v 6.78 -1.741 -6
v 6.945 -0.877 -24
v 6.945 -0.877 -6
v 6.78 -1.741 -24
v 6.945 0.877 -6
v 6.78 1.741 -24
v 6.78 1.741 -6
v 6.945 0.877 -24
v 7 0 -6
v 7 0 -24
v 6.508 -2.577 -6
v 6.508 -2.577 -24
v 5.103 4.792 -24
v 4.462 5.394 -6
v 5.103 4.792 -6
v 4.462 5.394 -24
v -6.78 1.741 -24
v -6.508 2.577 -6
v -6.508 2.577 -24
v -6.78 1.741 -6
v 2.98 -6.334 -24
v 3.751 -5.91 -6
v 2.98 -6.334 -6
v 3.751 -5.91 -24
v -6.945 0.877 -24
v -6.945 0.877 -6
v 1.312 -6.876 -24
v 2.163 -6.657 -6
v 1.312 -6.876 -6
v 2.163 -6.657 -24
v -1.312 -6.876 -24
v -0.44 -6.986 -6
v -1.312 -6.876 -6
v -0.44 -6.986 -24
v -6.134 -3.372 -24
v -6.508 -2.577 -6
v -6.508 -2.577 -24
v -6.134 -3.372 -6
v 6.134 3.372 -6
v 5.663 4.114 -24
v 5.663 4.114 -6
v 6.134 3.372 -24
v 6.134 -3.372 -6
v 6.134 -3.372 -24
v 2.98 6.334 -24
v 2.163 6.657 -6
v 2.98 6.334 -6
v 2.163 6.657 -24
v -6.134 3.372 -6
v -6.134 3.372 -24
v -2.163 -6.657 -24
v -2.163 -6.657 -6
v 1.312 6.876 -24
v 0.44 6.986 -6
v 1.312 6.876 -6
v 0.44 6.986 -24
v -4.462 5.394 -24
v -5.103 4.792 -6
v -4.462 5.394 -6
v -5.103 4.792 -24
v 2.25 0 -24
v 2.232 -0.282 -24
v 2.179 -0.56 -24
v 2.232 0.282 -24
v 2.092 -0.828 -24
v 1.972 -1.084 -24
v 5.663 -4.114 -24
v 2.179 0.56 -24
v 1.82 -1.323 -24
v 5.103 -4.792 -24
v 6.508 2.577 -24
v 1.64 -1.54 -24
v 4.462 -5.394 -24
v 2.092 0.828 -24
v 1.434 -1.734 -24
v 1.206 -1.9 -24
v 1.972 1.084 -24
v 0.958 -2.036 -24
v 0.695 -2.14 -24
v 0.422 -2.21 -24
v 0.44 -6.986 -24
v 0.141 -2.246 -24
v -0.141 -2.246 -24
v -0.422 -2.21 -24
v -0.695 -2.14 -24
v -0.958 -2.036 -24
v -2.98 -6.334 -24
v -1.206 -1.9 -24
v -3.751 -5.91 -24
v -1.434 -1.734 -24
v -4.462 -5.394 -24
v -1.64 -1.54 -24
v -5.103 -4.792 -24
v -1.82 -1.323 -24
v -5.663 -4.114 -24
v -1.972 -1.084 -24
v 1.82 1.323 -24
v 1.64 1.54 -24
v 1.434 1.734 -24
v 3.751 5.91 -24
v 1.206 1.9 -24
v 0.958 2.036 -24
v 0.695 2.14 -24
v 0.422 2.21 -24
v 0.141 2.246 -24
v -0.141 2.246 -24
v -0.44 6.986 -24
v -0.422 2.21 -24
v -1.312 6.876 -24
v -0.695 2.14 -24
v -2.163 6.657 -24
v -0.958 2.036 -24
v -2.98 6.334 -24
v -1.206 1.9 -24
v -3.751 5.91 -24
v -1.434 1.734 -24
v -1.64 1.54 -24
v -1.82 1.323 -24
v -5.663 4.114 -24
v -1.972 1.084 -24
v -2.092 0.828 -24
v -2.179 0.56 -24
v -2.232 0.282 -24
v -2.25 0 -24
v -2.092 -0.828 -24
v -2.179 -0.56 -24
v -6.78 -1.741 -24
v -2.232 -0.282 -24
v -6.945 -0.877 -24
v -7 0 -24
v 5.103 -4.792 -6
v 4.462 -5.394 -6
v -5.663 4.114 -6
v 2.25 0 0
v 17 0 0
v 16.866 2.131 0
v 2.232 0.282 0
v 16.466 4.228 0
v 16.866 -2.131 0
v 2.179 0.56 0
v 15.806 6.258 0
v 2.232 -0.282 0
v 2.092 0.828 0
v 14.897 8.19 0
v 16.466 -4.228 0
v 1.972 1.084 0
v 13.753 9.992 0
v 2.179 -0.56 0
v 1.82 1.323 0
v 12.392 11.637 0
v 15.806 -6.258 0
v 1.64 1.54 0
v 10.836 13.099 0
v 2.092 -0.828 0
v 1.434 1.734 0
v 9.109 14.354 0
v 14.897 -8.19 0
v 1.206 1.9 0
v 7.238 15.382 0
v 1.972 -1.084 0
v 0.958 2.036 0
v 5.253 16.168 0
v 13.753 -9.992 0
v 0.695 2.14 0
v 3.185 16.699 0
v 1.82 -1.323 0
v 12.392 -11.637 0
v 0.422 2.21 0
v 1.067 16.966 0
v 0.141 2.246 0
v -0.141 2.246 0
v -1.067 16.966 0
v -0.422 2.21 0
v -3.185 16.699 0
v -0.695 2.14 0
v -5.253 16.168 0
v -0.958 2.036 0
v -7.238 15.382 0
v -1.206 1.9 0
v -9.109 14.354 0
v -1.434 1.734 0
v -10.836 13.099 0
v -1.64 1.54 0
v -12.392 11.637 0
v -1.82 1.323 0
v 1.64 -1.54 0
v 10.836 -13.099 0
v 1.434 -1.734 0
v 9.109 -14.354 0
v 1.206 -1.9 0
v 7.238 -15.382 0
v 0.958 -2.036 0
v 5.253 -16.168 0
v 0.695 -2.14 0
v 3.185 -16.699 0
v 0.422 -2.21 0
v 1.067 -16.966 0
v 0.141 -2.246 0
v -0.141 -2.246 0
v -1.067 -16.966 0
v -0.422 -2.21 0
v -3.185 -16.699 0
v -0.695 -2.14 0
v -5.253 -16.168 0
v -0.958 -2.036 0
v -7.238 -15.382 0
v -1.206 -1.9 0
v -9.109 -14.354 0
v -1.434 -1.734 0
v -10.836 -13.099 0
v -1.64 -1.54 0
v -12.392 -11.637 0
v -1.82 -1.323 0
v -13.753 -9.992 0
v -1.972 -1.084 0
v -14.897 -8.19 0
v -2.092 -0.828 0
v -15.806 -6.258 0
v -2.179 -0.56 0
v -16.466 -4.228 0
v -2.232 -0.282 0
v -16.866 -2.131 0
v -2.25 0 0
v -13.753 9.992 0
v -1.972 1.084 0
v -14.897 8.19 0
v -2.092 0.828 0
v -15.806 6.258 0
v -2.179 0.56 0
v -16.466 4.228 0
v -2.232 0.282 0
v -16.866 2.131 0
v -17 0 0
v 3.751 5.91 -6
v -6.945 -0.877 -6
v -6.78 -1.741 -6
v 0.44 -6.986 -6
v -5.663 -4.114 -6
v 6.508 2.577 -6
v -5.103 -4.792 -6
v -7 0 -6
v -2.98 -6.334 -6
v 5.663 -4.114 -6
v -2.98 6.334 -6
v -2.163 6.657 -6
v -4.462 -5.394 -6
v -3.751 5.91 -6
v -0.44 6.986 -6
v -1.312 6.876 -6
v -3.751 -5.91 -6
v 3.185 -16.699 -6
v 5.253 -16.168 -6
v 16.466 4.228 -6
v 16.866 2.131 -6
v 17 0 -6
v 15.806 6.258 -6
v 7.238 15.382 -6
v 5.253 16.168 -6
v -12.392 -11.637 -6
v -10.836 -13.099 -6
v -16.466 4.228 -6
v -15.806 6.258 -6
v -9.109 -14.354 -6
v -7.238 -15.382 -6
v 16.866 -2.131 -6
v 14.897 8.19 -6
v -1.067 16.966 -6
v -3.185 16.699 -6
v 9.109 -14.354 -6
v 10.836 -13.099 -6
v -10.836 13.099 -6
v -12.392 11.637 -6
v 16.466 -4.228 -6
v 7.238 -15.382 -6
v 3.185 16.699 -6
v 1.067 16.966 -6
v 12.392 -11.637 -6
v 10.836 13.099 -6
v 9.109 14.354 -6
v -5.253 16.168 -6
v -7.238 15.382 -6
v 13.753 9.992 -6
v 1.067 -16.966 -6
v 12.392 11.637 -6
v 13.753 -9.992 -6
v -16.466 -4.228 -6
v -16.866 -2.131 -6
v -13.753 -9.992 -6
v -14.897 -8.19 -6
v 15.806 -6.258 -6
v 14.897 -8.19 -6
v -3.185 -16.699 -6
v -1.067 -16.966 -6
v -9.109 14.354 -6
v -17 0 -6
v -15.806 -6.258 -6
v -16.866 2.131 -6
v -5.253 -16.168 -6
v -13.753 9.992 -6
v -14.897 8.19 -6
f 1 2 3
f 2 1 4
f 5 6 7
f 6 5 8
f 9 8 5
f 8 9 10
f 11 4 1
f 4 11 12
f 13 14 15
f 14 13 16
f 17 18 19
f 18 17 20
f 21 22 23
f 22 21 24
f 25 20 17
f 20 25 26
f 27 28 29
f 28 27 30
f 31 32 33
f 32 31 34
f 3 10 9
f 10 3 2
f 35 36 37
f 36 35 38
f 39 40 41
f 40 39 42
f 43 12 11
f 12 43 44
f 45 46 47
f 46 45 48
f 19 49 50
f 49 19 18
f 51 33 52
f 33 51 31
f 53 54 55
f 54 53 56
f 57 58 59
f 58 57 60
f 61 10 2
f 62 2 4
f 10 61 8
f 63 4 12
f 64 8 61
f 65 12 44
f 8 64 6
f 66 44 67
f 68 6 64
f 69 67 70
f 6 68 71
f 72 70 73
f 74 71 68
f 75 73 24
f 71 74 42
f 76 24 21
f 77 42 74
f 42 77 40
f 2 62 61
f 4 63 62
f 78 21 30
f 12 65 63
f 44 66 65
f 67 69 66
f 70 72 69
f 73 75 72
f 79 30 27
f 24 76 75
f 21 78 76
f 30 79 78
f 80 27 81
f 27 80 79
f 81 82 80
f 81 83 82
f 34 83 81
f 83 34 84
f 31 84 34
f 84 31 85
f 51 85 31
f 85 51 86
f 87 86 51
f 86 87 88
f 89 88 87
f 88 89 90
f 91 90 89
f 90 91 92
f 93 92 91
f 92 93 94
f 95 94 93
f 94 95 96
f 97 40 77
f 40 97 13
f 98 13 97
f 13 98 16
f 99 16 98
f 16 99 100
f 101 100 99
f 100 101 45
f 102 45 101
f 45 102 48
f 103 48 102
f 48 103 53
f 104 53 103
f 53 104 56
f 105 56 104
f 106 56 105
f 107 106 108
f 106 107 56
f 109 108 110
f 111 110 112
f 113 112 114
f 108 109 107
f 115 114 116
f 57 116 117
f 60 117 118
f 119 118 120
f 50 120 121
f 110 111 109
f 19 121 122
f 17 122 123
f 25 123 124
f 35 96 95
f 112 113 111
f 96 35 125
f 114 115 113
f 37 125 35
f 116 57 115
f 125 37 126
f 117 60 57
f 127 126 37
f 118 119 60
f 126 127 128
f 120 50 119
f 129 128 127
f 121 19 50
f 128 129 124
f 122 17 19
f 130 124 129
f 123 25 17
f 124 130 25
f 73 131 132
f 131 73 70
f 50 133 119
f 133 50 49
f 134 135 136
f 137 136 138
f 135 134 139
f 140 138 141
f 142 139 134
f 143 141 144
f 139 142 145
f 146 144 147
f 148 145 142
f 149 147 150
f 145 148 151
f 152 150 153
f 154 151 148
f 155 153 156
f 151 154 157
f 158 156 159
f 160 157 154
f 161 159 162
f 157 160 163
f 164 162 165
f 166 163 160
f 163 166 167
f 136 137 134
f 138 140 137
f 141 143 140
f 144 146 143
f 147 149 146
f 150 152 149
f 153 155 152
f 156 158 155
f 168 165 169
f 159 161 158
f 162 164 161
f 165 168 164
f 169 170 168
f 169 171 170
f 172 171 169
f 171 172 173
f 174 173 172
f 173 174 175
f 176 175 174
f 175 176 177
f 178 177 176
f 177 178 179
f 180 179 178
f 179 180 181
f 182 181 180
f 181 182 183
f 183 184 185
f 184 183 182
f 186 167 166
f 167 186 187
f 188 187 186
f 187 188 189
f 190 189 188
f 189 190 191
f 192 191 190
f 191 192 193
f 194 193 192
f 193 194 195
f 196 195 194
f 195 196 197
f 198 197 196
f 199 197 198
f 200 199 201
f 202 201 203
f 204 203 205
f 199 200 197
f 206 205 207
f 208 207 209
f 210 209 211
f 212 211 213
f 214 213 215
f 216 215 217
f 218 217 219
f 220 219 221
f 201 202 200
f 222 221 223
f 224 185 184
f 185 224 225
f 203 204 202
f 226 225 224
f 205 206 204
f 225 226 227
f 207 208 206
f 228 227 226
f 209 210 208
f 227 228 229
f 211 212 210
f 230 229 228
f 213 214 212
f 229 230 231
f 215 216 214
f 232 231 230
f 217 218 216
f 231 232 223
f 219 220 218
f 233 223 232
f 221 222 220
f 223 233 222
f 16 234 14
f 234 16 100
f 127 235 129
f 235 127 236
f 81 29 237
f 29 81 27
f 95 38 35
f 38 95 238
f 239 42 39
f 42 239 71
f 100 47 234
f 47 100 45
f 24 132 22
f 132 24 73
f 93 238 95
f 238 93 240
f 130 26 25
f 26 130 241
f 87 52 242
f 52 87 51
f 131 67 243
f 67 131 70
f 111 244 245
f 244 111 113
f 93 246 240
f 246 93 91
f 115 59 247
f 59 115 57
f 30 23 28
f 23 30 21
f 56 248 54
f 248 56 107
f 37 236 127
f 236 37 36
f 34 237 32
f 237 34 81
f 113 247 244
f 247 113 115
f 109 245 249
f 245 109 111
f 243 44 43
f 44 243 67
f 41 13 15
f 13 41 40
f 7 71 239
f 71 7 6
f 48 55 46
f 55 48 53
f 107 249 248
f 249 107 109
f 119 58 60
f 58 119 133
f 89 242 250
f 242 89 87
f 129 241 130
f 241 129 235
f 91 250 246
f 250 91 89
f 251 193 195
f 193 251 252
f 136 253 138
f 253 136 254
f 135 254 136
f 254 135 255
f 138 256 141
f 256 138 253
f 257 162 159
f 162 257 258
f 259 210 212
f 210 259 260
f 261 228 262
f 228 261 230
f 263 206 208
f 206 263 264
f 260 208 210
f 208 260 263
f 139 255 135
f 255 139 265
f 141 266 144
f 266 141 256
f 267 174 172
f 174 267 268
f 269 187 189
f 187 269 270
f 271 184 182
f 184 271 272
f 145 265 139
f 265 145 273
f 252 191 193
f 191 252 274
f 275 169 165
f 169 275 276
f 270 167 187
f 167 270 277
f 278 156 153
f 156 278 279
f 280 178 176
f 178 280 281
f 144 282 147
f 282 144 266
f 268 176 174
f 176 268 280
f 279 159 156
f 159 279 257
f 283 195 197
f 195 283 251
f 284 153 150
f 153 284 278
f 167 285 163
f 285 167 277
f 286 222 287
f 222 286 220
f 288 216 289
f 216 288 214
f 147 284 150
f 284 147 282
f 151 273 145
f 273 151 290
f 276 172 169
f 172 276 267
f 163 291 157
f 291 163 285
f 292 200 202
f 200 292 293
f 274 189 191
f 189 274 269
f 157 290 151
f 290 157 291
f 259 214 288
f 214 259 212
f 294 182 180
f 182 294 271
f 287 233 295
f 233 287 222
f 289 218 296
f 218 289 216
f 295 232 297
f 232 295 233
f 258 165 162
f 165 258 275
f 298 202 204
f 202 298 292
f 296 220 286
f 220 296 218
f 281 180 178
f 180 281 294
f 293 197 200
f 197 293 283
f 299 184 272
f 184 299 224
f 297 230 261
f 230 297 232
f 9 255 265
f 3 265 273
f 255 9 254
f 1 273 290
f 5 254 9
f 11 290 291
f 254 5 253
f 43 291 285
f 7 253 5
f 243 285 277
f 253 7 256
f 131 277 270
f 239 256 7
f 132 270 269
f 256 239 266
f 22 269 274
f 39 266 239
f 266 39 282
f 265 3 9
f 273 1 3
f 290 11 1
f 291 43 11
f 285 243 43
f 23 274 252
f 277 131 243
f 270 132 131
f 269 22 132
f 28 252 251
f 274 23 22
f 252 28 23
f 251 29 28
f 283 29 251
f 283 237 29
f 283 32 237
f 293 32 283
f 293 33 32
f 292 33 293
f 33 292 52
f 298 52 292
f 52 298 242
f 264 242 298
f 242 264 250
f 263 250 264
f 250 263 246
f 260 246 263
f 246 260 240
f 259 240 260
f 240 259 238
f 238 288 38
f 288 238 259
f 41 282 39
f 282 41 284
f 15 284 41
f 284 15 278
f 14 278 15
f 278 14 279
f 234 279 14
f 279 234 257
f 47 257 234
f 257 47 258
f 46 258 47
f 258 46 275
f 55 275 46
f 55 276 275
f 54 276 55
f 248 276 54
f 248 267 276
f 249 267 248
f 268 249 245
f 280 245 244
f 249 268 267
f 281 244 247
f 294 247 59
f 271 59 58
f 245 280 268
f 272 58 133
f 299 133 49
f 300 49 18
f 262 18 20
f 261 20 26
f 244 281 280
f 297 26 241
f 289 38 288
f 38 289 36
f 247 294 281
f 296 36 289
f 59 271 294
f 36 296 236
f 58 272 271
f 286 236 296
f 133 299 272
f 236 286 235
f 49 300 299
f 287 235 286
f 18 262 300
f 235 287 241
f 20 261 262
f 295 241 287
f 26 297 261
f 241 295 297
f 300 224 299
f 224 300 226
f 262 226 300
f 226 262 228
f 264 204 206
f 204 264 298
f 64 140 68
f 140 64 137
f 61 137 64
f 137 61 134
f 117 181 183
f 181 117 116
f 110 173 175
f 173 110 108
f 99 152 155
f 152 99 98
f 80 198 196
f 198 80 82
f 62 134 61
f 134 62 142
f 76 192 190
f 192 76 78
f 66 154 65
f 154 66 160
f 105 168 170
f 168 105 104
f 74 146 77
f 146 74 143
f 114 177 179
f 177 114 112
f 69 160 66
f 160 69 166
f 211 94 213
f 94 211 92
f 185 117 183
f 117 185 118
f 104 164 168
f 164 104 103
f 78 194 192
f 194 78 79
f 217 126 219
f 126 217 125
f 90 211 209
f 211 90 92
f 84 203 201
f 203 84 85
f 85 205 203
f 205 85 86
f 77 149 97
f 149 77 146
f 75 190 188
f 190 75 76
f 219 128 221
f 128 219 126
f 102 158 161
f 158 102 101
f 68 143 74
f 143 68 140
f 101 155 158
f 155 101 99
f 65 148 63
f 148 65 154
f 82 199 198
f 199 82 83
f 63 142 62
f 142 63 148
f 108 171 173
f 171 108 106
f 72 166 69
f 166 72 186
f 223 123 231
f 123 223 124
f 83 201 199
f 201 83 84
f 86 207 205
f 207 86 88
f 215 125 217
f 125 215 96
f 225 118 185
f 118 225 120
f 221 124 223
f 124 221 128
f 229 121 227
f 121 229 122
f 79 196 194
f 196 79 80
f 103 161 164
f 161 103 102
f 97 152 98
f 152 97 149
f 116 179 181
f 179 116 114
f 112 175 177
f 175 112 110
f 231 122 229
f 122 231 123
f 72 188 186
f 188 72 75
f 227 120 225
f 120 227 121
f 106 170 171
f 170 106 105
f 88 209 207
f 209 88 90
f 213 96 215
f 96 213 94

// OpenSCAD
$fn = 50;


difference() {
	union() {
		translate(v = [0, 0, -24.0000000000]) {
			cylinder(h = 24, r = 7.0000000000);
		}
		translate(v = [0, 0, -6.0000000000]) {
			cylinder(h = 6, r = 17.0000000000);
		}
	}
	union() {
		#translate(v = [0, 0, -24]) {
			cylinder(h = 24, r = 2.2500000000);
		}
	}
}
